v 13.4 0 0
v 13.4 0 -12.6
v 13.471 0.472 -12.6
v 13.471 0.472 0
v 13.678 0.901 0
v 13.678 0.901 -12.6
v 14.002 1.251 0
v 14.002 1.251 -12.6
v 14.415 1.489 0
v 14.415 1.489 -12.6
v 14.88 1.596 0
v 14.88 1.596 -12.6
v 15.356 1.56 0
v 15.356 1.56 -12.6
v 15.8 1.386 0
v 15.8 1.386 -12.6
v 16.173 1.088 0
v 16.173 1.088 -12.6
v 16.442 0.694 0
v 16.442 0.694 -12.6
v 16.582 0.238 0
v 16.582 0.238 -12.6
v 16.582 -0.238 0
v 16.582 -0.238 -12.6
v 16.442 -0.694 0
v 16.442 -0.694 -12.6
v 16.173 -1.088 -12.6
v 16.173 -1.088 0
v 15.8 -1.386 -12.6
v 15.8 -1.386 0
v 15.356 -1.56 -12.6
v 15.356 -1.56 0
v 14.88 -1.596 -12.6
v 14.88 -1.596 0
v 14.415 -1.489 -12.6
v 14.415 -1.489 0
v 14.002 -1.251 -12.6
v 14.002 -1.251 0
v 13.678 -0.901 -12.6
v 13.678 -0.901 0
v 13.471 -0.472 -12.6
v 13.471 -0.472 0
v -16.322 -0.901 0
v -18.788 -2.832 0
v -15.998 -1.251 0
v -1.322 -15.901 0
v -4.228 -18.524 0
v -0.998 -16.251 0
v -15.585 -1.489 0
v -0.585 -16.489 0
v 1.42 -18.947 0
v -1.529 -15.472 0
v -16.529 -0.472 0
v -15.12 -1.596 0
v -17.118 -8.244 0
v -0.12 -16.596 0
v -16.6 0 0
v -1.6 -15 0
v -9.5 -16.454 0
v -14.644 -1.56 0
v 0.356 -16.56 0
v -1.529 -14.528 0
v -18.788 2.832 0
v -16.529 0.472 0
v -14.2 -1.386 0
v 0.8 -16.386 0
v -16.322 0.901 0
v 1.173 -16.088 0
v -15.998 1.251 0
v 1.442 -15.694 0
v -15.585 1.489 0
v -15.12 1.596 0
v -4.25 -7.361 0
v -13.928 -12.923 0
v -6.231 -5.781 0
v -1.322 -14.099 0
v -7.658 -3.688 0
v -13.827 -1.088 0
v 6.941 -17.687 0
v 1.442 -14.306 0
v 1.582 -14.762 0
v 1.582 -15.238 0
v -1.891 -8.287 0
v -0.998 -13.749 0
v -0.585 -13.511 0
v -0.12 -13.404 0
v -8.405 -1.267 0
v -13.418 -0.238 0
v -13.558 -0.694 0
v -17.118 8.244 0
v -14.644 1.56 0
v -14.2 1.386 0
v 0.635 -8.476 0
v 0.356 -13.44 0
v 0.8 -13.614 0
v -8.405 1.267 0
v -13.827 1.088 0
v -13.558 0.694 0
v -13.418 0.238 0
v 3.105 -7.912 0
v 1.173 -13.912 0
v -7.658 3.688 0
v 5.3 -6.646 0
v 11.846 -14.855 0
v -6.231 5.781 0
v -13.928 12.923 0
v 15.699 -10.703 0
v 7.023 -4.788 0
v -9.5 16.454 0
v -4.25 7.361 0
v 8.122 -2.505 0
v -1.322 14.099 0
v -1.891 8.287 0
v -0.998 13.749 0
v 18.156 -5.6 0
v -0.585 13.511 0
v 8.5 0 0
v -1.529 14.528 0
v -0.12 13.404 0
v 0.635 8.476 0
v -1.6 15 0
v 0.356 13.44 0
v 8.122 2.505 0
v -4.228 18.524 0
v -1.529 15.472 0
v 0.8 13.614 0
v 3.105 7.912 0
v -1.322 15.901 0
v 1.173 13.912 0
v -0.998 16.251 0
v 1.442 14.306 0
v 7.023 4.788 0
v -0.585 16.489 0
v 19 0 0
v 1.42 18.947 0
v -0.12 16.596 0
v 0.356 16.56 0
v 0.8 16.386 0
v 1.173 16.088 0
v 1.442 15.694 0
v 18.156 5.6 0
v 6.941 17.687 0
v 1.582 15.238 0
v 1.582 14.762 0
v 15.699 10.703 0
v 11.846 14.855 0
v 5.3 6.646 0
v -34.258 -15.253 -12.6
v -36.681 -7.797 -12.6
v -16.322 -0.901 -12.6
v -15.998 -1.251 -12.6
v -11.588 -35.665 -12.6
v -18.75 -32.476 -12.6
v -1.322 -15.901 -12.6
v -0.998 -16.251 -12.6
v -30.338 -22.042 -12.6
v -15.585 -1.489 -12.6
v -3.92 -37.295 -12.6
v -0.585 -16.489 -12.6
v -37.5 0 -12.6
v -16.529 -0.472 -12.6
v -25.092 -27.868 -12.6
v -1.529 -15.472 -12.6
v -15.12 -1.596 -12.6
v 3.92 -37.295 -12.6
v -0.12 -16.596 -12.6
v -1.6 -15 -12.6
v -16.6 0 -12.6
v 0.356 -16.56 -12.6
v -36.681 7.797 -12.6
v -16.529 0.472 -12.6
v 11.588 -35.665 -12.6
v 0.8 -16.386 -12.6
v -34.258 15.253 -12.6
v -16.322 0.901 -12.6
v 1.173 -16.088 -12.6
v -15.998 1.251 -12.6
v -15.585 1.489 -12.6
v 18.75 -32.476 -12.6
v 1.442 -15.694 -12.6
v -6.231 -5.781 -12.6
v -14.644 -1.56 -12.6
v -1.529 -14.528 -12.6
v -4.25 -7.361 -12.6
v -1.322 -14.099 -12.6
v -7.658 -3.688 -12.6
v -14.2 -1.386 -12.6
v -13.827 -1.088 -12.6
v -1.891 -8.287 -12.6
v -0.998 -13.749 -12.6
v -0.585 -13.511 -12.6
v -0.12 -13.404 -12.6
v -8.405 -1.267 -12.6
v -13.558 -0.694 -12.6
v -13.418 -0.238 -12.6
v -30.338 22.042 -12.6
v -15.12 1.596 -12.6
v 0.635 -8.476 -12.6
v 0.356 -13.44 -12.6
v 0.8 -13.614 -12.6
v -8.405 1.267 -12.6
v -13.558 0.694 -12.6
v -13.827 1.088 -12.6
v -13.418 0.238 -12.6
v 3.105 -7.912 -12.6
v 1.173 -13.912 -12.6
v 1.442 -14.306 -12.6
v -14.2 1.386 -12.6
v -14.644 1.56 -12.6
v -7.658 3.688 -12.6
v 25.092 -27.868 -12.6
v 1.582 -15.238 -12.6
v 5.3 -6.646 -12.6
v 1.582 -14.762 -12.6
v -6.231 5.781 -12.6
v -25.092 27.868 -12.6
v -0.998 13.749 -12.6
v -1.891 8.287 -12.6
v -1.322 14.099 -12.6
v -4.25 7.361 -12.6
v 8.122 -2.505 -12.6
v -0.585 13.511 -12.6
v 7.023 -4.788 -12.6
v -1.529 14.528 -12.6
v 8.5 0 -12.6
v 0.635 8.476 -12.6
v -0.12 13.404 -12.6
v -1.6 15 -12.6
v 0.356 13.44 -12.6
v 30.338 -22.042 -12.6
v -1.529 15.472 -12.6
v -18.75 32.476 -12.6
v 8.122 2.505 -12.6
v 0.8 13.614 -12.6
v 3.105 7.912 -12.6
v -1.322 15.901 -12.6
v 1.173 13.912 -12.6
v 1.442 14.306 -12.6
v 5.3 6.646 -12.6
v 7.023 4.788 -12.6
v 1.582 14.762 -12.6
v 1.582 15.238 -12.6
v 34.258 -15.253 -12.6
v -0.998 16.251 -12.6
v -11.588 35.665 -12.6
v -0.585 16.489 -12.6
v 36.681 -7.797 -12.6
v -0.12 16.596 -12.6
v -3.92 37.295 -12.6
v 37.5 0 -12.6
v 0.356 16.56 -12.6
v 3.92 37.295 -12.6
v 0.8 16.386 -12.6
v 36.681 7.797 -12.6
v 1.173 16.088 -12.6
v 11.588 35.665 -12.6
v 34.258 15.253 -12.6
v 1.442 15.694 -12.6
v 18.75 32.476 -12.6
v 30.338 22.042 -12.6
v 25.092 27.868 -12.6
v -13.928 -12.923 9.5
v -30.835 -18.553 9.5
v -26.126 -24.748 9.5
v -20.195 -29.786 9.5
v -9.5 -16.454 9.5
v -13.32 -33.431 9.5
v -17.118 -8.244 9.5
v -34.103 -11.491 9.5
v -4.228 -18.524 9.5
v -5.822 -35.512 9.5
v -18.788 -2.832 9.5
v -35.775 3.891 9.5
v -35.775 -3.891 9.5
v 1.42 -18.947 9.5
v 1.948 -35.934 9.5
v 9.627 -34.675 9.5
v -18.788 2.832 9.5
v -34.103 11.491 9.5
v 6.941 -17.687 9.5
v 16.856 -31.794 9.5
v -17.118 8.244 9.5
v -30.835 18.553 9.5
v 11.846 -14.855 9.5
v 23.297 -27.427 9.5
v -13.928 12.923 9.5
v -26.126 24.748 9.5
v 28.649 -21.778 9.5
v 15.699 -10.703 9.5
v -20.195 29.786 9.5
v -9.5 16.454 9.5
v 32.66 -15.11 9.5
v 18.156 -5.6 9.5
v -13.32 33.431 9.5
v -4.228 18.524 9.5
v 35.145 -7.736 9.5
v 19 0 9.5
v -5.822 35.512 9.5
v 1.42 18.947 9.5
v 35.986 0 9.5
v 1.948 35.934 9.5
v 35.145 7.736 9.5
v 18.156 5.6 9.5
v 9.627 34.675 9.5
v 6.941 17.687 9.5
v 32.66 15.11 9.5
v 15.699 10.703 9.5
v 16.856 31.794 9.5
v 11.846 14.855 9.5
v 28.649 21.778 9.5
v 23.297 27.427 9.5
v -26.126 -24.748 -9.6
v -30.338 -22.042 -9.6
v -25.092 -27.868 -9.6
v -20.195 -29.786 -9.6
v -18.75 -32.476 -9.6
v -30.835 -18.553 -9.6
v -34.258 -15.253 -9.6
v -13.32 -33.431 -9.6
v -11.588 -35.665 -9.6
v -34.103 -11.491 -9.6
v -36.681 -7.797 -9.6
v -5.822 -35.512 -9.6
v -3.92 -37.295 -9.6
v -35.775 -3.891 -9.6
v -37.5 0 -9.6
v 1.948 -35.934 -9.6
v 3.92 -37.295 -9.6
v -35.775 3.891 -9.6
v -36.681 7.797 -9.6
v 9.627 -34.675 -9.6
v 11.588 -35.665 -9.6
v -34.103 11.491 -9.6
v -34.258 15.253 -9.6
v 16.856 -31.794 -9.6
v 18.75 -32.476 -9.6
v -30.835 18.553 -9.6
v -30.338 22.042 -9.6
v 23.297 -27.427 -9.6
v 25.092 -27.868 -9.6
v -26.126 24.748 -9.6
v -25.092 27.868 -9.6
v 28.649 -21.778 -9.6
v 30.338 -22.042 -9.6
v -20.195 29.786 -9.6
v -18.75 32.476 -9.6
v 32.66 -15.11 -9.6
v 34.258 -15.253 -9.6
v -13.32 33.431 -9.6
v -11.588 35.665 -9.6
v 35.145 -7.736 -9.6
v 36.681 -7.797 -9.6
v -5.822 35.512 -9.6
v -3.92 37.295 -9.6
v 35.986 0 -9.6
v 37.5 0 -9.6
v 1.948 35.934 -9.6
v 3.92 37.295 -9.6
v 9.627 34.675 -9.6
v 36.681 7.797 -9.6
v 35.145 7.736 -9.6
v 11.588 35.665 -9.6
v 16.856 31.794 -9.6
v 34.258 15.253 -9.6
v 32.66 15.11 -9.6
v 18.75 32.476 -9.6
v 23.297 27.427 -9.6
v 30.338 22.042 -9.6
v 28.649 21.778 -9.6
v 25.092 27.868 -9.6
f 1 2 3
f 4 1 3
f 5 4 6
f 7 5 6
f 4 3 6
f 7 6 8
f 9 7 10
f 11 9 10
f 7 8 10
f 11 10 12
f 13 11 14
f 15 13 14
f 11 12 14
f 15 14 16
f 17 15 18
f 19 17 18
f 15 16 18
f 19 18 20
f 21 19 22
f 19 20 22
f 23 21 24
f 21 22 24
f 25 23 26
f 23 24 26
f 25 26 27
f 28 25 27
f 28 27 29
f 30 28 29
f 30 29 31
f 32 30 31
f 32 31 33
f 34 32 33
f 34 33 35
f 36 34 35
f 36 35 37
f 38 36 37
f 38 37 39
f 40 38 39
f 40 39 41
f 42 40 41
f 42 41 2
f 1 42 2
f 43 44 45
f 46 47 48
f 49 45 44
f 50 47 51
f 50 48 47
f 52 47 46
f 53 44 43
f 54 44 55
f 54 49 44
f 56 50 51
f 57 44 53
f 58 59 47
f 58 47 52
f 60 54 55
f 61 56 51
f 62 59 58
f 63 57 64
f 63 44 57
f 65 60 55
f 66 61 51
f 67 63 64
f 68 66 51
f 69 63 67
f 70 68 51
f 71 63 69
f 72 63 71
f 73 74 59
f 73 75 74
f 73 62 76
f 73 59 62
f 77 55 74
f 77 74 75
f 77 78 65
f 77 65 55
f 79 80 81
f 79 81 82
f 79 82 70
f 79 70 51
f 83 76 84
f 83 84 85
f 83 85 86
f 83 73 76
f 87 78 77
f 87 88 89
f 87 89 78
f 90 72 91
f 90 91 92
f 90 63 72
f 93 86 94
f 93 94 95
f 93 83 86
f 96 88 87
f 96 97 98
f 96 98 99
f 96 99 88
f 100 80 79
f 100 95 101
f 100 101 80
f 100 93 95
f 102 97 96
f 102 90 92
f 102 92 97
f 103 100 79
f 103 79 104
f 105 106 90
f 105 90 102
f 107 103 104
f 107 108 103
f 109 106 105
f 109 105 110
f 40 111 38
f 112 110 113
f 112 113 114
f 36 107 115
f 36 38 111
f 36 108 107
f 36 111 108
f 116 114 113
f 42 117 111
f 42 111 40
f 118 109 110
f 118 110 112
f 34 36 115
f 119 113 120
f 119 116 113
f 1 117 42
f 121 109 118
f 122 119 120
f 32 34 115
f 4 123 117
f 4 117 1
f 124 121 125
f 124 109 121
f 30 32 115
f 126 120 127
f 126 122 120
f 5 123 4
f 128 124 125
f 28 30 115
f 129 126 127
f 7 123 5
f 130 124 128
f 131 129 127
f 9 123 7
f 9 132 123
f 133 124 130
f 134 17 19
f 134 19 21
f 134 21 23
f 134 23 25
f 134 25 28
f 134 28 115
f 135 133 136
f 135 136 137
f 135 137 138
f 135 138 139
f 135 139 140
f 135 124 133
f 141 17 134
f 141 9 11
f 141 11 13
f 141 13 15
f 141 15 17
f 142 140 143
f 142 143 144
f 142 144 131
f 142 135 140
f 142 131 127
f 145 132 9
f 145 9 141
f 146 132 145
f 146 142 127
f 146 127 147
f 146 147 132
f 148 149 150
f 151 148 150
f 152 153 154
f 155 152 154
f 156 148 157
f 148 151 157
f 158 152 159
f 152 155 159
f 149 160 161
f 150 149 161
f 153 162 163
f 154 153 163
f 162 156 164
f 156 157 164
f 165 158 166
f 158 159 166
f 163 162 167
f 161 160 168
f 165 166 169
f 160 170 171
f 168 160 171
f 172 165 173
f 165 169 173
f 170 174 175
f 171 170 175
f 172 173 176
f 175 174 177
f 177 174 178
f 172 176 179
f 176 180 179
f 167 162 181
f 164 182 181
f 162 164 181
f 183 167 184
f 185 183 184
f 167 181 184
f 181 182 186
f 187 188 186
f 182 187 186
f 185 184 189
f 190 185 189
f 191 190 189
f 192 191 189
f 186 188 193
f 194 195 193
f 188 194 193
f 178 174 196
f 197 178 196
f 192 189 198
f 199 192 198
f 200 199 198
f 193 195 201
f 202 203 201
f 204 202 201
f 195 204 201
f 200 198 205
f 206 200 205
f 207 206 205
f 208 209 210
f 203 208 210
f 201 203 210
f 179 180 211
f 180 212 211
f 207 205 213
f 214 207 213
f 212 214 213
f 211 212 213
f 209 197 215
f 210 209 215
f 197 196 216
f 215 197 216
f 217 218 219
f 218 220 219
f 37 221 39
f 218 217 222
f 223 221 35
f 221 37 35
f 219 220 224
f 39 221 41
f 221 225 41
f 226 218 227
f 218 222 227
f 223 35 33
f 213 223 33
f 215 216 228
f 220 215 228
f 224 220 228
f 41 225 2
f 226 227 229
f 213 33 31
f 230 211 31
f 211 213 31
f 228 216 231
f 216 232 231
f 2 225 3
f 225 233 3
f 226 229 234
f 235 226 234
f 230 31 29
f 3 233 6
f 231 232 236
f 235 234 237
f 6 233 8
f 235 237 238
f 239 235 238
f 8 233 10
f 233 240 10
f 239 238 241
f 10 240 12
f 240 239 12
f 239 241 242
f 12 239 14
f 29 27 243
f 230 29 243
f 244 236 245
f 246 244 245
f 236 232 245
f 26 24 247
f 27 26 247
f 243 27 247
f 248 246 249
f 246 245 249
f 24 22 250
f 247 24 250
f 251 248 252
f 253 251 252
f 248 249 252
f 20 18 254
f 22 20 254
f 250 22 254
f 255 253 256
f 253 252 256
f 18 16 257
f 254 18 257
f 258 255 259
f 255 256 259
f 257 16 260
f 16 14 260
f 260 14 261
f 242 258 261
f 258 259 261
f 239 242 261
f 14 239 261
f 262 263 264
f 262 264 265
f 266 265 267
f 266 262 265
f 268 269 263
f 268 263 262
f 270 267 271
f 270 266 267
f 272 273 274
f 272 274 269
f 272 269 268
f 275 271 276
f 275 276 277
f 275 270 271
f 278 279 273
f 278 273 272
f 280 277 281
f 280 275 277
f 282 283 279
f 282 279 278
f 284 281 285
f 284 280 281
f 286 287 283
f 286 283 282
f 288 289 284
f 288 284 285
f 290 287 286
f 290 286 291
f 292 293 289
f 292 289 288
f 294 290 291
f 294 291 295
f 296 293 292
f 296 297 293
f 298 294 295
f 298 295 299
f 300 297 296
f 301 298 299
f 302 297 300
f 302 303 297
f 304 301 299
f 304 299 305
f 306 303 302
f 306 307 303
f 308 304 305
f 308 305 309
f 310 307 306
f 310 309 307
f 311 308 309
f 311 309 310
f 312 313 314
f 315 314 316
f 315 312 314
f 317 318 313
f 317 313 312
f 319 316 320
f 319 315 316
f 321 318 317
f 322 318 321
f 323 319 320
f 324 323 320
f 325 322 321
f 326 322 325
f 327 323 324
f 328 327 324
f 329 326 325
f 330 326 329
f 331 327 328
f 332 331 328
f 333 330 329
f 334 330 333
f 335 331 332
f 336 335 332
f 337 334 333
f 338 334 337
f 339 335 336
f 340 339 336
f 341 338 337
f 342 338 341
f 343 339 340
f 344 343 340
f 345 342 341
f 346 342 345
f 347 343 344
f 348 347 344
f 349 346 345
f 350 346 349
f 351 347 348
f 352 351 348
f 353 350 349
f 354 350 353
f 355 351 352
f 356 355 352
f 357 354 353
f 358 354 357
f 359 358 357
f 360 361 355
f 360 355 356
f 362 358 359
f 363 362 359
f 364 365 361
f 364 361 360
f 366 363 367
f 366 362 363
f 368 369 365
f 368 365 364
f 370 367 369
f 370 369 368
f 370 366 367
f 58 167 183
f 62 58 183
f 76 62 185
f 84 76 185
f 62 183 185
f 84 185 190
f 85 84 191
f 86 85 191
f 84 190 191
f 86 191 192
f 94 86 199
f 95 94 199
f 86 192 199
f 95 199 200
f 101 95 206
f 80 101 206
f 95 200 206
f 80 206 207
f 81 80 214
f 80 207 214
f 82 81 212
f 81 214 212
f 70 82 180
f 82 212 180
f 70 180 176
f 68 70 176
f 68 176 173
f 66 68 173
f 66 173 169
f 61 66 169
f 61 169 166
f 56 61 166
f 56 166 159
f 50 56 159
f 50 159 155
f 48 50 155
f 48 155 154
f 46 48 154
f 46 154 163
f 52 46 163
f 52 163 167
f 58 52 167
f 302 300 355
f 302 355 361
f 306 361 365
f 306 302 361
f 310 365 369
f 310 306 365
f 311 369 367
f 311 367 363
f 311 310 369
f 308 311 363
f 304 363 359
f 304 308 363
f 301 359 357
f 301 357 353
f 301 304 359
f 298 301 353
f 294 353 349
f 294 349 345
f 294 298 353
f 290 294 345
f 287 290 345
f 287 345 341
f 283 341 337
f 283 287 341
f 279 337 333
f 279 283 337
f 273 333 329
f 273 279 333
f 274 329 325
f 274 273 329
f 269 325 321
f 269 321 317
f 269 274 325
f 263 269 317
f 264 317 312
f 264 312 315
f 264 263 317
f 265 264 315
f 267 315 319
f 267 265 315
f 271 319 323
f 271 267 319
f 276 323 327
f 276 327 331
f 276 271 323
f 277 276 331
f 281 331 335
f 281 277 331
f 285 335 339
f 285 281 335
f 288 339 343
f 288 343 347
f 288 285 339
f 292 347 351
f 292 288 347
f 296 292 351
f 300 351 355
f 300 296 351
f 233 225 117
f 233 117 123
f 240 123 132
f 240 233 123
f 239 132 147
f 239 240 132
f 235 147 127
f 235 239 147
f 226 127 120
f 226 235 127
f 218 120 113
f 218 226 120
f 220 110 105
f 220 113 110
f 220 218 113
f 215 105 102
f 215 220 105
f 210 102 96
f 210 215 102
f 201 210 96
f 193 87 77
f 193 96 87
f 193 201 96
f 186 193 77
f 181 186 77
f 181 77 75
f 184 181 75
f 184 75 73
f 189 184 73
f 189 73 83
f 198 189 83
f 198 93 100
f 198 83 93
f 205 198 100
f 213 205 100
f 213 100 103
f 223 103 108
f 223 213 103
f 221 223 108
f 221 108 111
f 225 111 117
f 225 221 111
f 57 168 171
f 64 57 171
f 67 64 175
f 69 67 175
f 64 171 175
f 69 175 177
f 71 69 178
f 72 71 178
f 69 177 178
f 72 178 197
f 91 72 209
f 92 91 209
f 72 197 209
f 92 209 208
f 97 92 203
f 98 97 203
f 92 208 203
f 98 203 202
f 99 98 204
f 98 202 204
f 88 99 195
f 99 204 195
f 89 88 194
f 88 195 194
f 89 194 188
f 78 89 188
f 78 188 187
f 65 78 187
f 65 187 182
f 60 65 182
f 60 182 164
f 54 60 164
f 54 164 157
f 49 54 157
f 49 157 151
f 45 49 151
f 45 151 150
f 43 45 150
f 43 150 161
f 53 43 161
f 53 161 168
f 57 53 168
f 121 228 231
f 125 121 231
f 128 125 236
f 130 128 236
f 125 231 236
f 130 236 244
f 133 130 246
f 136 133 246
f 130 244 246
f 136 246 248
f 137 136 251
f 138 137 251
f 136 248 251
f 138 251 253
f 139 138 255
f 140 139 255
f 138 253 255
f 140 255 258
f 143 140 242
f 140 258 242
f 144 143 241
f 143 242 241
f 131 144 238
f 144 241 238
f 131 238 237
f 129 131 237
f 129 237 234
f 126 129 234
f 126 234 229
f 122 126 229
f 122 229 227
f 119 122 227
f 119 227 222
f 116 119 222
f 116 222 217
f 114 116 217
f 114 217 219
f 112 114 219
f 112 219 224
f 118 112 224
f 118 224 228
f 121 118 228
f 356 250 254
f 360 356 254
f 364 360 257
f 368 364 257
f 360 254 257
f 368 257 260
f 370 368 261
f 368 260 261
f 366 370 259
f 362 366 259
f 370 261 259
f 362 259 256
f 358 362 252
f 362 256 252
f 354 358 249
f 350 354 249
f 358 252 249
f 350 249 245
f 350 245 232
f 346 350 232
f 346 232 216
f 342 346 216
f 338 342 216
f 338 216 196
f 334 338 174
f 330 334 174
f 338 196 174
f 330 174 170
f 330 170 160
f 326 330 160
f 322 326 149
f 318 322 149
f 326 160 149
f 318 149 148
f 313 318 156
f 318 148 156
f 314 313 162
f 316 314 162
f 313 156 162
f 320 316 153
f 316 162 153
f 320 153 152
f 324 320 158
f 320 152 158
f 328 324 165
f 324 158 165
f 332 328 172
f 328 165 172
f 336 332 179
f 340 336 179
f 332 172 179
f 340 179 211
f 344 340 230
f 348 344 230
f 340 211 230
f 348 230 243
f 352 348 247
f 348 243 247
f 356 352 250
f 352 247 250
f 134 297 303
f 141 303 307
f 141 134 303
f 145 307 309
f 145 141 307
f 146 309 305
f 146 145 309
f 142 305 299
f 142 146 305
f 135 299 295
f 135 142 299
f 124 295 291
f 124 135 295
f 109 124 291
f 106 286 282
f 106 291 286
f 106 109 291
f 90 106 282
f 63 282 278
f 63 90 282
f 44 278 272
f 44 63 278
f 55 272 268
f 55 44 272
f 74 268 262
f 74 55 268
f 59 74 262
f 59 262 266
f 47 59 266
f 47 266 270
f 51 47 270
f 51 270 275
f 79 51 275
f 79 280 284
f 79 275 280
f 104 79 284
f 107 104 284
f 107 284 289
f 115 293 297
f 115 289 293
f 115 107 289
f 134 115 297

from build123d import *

# Parameters (mm, degrees)
EXTRUDE_START            = 9.5
SKETCH_1_R               = 35.986394748
EXTRUDE_1_DEPTH          = 19.1
SKETCH_1_3_R             = 19
CUT_EXTRUDE_1_DEPTH      = 52.789972136
EXTRUDE_START_2          = -12.6
SKETCH_1_4_R             = 37.5
EXTRUDE_2_DEPTH          = 3
CUT_EXTRUDE_2_DEPTH      = 55.509265267
CUT_EXTRUDE_2_DEPTH_BACK = 55.509265267
SKETCH_1_5_R             = 8.5
HOLE_WIZARD_M3_1_D       = 3.2


with BuildPart() as part:
    # ｽｹｯﾁ1 → ﾎﾞｽ - 押し出し1 (new body)
    with BuildSketch(Plane.XY.offset(EXTRUDE_START)):
        Circle(SKETCH_1_R)
    extrude(amount=-EXTRUDE_1_DEPTH)

    # ｽｹｯﾁ1<3> → ｶｯﾄ - 押し出し1 (cut, through all)
    with BuildSketch(Plane.XY):
        Circle(SKETCH_1_3_R)
    extrude(amount=CUT_EXTRUDE_1_DEPTH, mode=Mode.SUBTRACT)

    # ｽｹｯﾁ1<4> → ﾎﾞｽ - 押し出し2 (add)
    with BuildSketch(Plane.XY.offset(EXTRUDE_START_2)):
        Circle(SKETCH_1_4_R)
    extrude(amount=EXTRUDE_2_DEPTH)

    # ｽｹｯﾁ1<5> → ｶｯﾄ - 押し出し2 (cut, two sides: drawn at the far end of the back side and taken through both)
    with BuildSketch(Plane.XY.offset(-CUT_EXTRUDE_2_DEPTH_BACK)):
        Circle(SKETCH_1_5_R)
    extrude(amount=CUT_EXTRUDE_2_DEPTH + CUT_EXTRUDE_2_DEPTH_BACK, mode=Mode.SUBTRACT)

    # M3 すきま穴1 (through all)
    with Locations(Plane(origin=(0, 15, 0), x_dir=(1, 0, 0), z_dir=(0, 0, 1))):
        with Locations((0, 0), (-15, -15), (0, -30), (15, -15)):
            Hole(HOLE_WIZARD_M3_1_D / 2)


solid = part.part
